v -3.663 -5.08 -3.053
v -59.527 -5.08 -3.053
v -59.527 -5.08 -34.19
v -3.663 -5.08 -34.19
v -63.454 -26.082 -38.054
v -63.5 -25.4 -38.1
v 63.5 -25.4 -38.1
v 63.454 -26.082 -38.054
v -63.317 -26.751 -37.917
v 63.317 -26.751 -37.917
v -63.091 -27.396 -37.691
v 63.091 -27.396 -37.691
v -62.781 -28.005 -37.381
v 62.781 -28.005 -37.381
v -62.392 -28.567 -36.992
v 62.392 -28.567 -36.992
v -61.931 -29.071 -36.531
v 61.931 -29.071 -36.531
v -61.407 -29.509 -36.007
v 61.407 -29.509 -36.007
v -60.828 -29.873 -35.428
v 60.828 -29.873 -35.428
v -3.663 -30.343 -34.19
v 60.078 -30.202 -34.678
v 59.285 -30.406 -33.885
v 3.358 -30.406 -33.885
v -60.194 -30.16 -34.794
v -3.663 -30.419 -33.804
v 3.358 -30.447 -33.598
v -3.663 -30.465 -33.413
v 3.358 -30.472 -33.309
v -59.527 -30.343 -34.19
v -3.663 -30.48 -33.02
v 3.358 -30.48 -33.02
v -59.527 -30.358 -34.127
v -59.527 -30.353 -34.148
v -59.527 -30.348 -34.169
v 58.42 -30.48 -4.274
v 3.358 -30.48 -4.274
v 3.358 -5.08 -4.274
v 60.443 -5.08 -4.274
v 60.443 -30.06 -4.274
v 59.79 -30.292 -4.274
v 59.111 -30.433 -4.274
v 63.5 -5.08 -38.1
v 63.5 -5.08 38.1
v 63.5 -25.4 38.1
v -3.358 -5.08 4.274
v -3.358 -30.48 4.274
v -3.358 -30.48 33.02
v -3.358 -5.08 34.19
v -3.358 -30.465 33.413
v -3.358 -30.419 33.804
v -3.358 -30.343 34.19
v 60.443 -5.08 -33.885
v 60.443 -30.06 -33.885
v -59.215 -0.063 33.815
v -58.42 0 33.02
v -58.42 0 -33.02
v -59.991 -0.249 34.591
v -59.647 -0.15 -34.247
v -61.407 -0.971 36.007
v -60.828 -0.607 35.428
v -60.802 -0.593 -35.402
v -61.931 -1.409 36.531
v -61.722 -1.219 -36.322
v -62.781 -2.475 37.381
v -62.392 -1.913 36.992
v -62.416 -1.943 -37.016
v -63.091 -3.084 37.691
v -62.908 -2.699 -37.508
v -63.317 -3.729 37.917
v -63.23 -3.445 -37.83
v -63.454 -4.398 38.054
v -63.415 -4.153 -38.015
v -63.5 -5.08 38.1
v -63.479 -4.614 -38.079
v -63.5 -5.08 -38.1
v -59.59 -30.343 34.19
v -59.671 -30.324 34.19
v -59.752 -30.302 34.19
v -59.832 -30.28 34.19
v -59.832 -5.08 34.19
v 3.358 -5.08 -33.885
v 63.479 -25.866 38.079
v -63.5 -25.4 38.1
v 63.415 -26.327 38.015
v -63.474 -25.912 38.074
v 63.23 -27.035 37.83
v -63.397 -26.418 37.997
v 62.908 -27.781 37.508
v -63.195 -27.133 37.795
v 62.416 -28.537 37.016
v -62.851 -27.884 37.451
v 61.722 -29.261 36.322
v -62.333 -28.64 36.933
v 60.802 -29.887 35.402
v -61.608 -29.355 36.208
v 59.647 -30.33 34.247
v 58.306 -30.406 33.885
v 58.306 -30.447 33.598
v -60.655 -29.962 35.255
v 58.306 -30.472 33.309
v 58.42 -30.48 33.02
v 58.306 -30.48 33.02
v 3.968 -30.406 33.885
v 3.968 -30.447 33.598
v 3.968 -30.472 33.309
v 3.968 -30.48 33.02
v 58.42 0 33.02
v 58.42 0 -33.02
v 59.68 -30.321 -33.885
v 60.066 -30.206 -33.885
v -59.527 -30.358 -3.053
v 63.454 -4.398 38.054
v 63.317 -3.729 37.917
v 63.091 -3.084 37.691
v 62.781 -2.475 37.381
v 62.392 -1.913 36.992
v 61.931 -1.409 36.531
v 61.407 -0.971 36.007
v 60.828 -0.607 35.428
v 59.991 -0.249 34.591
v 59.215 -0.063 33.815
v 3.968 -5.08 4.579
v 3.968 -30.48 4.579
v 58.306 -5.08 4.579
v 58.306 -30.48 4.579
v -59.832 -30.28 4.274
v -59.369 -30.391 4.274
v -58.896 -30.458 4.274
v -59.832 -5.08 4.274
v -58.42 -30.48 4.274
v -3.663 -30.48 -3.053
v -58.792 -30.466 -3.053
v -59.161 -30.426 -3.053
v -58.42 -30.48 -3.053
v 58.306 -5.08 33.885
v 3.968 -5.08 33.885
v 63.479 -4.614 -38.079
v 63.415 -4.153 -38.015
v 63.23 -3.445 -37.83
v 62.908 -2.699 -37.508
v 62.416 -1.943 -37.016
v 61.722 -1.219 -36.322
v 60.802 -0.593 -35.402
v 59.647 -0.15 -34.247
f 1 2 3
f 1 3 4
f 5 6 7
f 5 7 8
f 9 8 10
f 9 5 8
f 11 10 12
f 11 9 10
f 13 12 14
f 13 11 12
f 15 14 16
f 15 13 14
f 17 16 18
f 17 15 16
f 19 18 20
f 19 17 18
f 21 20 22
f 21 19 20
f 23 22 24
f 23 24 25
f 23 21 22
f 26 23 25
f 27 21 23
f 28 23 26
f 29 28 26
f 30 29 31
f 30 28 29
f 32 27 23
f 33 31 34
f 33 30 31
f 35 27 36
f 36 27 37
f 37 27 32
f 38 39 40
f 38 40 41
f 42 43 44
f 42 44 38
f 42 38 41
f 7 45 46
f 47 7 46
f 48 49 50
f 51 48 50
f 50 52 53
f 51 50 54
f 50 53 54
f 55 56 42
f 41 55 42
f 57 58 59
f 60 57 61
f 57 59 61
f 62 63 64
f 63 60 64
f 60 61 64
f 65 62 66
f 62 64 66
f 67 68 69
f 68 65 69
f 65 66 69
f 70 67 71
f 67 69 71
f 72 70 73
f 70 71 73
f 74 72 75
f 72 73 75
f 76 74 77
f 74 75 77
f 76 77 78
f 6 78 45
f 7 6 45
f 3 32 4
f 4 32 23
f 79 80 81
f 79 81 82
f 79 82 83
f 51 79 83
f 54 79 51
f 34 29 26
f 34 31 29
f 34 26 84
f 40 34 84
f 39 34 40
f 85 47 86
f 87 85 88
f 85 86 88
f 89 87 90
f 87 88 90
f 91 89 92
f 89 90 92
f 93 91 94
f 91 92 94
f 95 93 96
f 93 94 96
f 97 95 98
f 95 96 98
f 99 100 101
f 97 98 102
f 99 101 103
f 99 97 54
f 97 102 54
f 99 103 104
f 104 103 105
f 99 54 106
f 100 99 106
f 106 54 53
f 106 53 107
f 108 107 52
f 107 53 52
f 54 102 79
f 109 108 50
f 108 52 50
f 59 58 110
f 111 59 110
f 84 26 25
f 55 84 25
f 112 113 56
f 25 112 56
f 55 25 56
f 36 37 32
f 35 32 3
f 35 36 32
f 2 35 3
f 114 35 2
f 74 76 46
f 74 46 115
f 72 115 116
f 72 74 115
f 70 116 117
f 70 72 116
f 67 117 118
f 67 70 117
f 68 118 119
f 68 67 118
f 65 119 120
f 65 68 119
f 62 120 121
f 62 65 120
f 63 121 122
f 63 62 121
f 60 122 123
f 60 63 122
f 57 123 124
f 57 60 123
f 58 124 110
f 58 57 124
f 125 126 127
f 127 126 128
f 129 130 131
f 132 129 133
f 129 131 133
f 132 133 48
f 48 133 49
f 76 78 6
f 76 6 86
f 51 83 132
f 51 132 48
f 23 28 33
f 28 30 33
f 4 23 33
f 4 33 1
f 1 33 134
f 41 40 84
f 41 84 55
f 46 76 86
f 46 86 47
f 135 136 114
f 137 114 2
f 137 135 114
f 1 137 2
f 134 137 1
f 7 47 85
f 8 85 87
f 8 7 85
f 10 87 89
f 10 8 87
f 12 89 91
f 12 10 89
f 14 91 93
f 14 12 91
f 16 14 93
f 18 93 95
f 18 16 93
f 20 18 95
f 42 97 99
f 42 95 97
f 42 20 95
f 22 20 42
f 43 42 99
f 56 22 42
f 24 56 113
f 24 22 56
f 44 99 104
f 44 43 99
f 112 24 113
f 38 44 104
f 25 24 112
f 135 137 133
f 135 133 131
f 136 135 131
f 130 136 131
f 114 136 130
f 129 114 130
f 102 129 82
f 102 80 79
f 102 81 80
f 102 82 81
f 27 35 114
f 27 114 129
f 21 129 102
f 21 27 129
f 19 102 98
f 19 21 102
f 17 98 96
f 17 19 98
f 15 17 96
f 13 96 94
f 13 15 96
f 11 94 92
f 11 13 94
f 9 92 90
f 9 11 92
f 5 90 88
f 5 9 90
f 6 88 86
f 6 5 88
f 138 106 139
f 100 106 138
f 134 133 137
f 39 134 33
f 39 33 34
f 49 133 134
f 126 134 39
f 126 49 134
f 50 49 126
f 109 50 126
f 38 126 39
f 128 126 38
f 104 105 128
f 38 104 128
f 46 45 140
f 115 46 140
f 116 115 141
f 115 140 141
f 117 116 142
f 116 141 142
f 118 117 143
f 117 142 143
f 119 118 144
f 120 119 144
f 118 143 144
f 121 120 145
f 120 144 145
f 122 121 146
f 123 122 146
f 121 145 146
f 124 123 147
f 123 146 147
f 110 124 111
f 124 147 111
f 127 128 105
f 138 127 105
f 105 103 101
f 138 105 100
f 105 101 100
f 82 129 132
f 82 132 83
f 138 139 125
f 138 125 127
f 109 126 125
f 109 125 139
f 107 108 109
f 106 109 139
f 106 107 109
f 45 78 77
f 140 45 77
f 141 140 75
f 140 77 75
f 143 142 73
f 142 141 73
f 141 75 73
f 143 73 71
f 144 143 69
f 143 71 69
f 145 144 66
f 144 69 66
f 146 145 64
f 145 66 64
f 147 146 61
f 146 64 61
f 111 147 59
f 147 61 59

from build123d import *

# Parameters (mm, degrees)
F0_W        = 127
F0_H        = 76.2
F1_DEPTH    = 30.48
F2_W        = 56.4744591247
F2_H        = 29.9161975272
F2_W_2      = 54.3375890702
F2_H_2      = 29.3056648225
F2_W_3      = 57.0849904325
F2_H_3      = 29.6109346673
F2_W_4      = 55.8639247902
F2_H_4      = 31.1372692231
F3_DEPTH    = 25.4
F4_T1_DEPTH = 152.4
F4_T3_DEPTH = 101.6


# Not quite as in the source:
# - a fillet or chamfer that OpenCascade refuses, or shapes differently, is made with other operations: its cross-section is extruded or revolved along the edge and cut away or added


with BuildPart() as f1:
    # F0 (on Front) → F1 (new body)
    with BuildSketch(Plane.XZ):
        Rectangle(F0_W, F0_H)
    extrude(amount=F1_DEPTH)

    # F2 (on face) → F3 (cut)
    with BuildSketch(Plane.XZ.offset(30.48)):
        with Locations((-31.5951720113, 19.2318481859)):
            Rectangle(F2_W, F2_H)
        with Locations((31.1372699216, 19.23184935)):
            Rectangle(F2_W_2, F2_H_2)
        with Locations((31.9004367338, -19.0792032517)):
            Rectangle(F2_W_3, F2_H_3)
        with Locations((-31.5951702651, -18.6213011621)):
            Rectangle(F2_W_4, F2_H_4)
    extrude(amount=-F3_DEPTH, mode=Mode.SUBTRACT)

    # F4: fillet of radius 5.08 on 8 edges, made by hand

    # F4_s2 → F4_t1 (cut)
    with BuildSketch(Plane.YZ.offset(-76.2)):
        with BuildLine():
            ThreePointArc((-25.4, -38.1), (-28.9921024484, -36.6121024484), (-30.48, -33.02))
            Line((-30.48, -33.02), (-30.48, -38.1))
            Line((-30.48, -38.1), (-25.4, -38.1))
        make_face()
        with BuildLine():
            ThreePointArc((-25.4, 38.1), (-28.9921024484, 36.6121024484), (-30.48, 33.02))
            Line((-30.48, 33.02), (-30.48, 38.1))
            Line((-30.48, 38.1), (-25.4, 38.1))
        make_face()
        with BuildLine():
            ThreePointArc((-5.08, -38.1), (-1.4878975516, -36.6121024484), (0, -33.02))
            Line((0, -33.02), (0, -38.1))
            Line((0, -38.1), (-5.08, -38.1))
        make_face()
        with BuildLine():
            ThreePointArc((-5.08, 38.1), (-1.4878975516, 36.6121024484), (0, 33.02))
            Line((0, 33.02), (0, 38.1))
            Line((0, 38.1), (-5.08, 38.1))
        make_face()
    extrude(amount=F4_T1_DEPTH, mode=Mode.SUBTRACT)

    # F4_s4 → F4_t3 (cut)
    with BuildSketch(Plane.XY.offset(-50.8)):
        with BuildLine():
            ThreePointArc((-58.42, -30.48), (-62.0121024484, -28.9921024484), (-63.5, -25.4))
            Line((-63.5, -25.4), (-63.5, -30.48))
            Line((-63.5, -30.48), (-58.42, -30.48))
        make_face()
        with BuildLine():
            ThreePointArc((63.5, -25.4), (62.0121024484, -28.9921024484), (58.42, -30.48))
            Line((58.42, -30.48), (63.5, -30.48))
            Line((63.5, -30.48), (63.5, -25.4))
        make_face()
        with BuildLine():
            ThreePointArc((-58.42, 0), (-62.0121024484, -1.4878975516), (-63.5, -5.08))
            Line((-63.5, -5.08), (-63.5, 0))
            Line((-63.5, 0), (-58.42, 0))
        make_face()
        with BuildLine():
            ThreePointArc((63.5, -5.08), (62.0121024484, -1.4878975516), (58.42, 0))
            Line((58.42, 0), (63.5, 0))
            Line((63.5, 0), (63.5, -5.08))
        make_face()
    extrude(amount=F4_T3_DEPTH, mode=Mode.SUBTRACT)


solid = f1.part
